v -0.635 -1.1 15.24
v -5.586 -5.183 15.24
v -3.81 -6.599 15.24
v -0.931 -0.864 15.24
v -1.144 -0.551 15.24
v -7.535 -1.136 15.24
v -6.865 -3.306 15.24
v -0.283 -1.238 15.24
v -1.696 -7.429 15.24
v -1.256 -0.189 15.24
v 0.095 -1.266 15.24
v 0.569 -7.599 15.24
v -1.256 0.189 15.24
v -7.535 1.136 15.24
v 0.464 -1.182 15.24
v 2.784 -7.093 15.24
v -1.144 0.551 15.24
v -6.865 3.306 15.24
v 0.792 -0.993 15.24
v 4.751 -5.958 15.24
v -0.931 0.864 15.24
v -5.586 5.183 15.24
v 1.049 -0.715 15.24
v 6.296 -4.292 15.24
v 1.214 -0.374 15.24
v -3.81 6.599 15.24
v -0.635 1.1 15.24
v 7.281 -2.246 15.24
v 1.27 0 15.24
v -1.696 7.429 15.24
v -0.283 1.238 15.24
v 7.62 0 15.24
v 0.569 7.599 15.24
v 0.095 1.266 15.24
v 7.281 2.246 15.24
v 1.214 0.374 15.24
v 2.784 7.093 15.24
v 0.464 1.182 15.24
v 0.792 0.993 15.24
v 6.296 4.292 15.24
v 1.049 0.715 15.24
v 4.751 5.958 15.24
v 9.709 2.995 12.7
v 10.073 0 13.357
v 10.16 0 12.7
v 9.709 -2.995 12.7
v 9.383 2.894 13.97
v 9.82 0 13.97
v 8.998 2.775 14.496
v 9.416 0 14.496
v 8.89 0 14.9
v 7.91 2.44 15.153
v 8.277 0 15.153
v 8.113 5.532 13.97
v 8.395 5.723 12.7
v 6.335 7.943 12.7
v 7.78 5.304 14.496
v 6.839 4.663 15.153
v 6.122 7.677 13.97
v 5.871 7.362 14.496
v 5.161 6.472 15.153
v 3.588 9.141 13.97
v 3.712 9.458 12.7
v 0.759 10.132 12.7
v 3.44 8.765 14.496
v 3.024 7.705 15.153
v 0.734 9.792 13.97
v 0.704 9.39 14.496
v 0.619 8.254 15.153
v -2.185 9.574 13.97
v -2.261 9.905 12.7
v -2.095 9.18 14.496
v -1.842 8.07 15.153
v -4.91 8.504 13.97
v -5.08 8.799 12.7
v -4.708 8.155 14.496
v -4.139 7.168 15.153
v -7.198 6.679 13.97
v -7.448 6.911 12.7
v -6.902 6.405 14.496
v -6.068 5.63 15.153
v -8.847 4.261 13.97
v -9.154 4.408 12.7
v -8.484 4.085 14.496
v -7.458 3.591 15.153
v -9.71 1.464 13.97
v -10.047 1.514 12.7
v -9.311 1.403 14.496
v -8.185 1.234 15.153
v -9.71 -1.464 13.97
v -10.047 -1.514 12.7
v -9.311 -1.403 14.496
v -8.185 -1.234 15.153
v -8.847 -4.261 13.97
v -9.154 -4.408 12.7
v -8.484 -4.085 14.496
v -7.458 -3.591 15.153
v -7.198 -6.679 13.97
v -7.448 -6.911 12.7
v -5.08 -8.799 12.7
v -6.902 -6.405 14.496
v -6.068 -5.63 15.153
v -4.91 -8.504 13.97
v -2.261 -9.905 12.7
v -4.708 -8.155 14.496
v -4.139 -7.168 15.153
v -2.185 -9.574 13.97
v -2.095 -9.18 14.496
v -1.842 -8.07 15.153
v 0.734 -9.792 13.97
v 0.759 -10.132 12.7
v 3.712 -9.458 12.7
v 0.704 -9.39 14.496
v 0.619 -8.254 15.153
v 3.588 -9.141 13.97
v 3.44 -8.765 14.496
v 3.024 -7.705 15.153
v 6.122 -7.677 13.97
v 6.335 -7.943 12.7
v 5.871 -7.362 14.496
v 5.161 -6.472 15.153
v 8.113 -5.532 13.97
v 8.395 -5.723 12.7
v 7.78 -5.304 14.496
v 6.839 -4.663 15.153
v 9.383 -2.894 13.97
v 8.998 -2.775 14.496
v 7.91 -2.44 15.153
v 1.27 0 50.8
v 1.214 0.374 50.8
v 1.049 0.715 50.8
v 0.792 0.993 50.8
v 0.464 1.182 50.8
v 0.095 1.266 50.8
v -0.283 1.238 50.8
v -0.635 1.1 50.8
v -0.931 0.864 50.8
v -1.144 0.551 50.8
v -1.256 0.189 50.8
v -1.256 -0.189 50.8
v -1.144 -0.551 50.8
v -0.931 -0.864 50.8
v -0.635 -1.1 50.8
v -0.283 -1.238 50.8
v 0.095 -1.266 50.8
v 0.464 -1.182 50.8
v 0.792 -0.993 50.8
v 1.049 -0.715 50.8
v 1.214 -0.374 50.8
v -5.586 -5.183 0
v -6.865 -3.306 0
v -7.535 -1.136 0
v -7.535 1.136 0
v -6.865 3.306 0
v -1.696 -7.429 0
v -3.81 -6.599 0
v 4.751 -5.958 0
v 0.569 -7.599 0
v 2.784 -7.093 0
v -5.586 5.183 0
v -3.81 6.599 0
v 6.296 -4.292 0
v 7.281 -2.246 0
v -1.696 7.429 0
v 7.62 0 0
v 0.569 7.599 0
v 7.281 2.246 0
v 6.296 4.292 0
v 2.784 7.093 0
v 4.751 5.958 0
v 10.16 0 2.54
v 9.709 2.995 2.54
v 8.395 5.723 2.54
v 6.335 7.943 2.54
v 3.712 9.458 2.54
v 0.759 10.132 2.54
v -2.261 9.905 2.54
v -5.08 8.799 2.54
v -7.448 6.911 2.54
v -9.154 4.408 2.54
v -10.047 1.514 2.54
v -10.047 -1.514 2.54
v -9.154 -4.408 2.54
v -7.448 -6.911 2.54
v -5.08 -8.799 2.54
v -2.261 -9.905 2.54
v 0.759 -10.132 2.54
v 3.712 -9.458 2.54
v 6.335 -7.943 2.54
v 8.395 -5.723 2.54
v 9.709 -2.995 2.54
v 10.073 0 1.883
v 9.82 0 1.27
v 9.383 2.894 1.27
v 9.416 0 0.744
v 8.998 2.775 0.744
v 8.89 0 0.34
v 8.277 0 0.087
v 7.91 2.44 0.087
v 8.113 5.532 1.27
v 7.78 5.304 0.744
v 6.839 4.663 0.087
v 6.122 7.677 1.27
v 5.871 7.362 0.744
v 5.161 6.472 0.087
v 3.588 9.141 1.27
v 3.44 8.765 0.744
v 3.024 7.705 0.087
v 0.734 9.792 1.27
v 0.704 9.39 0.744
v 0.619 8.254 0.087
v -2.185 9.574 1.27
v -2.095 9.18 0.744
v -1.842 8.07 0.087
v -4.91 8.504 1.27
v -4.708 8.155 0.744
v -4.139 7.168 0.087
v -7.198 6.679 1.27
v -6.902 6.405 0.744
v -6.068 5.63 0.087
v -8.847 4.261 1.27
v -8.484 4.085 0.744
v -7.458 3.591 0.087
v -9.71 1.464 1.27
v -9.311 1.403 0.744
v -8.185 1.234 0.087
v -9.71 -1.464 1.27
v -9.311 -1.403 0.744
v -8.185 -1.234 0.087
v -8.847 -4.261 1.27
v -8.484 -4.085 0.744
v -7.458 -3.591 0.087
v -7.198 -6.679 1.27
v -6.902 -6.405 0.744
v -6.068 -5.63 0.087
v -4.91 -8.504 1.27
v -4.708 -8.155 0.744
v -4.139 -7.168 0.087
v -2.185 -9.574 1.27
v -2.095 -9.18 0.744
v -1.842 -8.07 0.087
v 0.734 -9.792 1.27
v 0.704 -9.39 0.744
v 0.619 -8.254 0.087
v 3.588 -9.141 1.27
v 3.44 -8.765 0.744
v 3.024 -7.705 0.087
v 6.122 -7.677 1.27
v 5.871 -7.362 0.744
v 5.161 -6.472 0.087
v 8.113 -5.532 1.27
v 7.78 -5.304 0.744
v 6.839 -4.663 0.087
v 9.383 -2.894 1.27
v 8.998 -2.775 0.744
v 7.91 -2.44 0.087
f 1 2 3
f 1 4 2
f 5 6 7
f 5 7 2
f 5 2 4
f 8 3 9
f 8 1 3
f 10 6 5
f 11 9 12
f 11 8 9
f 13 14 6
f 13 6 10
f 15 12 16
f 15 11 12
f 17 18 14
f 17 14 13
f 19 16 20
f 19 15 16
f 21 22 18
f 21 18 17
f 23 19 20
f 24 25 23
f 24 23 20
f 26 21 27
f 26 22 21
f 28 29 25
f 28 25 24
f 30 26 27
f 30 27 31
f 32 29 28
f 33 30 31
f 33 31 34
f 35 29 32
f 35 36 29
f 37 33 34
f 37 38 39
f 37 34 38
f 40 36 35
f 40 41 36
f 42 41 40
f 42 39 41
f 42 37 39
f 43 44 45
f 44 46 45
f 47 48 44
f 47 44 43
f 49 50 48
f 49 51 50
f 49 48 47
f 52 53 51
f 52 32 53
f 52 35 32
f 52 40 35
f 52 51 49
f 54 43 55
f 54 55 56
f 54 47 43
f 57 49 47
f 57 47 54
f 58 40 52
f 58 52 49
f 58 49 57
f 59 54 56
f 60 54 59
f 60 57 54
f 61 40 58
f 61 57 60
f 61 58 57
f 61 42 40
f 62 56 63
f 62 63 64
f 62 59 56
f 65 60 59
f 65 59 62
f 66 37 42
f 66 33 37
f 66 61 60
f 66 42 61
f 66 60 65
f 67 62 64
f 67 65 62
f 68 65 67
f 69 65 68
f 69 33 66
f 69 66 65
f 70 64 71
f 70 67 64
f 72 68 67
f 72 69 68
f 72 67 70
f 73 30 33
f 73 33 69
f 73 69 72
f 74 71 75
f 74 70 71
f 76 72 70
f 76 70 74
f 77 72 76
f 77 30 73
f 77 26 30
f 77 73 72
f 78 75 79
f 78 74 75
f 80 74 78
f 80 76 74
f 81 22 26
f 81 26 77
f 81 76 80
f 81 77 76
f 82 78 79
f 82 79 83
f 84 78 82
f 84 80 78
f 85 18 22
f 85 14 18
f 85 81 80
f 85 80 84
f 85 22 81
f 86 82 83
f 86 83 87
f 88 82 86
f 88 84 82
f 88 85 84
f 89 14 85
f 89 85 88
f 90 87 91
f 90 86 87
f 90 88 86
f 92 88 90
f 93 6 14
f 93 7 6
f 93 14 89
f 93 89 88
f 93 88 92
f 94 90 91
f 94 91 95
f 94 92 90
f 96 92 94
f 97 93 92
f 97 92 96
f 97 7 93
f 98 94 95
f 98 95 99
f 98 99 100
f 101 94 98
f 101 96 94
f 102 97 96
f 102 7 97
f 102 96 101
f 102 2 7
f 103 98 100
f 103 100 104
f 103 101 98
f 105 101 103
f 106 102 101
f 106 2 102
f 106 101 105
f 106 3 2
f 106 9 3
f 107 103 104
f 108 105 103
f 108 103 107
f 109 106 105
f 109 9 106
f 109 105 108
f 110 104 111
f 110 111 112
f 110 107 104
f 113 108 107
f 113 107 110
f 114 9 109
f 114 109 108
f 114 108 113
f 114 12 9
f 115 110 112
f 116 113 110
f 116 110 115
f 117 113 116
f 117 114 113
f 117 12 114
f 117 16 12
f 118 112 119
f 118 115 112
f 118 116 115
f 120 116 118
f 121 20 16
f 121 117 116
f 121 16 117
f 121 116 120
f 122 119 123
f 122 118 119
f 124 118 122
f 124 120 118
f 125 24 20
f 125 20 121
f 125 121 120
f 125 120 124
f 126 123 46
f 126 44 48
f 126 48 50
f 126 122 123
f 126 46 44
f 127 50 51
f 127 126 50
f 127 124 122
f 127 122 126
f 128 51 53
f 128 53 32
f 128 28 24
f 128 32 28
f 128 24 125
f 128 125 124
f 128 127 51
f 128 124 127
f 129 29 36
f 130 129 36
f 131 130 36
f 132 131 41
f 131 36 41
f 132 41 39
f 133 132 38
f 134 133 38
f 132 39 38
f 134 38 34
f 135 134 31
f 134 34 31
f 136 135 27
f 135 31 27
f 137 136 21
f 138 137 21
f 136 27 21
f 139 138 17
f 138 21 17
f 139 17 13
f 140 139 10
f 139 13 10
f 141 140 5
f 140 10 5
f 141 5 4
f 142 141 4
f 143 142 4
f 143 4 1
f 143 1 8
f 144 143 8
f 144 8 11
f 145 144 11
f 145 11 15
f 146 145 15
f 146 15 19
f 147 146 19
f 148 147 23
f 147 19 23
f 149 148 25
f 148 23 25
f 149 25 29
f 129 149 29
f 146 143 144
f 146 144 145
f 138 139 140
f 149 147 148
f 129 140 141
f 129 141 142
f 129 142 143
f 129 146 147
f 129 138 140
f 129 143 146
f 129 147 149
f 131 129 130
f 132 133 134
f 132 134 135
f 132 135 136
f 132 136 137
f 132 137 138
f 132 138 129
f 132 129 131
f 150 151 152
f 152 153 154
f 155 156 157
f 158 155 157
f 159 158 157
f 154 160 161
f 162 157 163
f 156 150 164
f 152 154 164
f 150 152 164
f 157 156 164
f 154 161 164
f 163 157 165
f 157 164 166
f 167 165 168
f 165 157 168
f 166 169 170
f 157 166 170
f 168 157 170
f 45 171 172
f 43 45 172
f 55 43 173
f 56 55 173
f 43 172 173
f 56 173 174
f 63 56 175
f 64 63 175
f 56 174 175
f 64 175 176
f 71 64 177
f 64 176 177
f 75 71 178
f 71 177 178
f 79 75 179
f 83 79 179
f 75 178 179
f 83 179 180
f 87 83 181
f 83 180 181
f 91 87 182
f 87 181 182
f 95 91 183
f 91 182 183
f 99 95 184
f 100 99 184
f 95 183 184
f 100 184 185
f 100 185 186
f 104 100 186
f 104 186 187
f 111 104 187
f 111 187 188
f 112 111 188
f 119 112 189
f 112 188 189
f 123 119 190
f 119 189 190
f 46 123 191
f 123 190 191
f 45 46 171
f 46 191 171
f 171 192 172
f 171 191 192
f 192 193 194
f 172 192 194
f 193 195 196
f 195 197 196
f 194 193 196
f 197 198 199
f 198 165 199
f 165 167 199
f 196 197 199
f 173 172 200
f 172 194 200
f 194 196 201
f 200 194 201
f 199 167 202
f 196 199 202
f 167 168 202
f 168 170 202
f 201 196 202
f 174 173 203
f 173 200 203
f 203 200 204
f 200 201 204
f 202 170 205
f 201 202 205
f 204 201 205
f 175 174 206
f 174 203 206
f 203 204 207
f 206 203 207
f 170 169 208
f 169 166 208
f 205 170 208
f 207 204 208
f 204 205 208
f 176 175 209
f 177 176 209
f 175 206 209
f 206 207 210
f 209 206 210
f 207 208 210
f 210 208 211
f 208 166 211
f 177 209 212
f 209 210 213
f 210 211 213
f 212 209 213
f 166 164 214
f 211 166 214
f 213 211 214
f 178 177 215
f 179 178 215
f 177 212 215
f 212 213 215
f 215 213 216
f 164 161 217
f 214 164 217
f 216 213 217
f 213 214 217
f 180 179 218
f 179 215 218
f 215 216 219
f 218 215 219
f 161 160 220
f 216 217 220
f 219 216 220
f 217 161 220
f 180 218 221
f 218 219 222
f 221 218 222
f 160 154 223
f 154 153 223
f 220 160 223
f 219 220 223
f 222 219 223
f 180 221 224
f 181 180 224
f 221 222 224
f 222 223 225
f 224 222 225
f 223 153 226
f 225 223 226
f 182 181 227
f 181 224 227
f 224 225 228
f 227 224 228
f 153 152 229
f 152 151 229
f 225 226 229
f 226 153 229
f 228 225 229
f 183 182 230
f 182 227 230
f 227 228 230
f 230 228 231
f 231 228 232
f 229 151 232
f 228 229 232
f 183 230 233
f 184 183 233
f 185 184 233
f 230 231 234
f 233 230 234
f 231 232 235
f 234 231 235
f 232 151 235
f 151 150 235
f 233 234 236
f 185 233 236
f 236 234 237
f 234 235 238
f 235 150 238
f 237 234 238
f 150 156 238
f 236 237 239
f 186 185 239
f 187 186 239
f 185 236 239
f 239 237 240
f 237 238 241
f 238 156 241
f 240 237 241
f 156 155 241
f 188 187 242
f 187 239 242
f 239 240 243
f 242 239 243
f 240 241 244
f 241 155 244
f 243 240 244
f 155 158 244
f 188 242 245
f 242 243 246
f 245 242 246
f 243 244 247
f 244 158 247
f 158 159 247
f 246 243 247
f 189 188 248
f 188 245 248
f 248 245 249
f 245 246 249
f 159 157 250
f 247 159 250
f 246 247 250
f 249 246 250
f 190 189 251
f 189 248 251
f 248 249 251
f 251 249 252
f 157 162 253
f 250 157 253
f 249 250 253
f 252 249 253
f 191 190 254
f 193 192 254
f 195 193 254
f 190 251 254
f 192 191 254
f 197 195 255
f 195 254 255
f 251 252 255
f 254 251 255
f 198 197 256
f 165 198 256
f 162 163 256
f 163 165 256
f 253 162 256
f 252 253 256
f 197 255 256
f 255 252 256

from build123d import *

# Parameters (mm, degrees)
F0_R     = 10.16
F1_DEPTH = 15.24
F2_R     = 2.54
F3_R     = 1.27
F4_DEPTH = 35.56


with BuildPart() as f1:
    # F0 (on Top) → F1 (new body)
    with BuildSketch(Plane.XY):
        Circle(F0_R)
    extrude(amount=F1_DEPTH)

    # F2
    f2_edges = [f1.edges().sort_by_distance(p)[0] for p in [
        (-10.16, 0, 15.24),
        (-10.16, 0, 0),
    ]]
    fillet(f2_edges, radius=F2_R)

    # F3 (on face) → F4 (join)
    with BuildSketch(Plane.XY.offset(15.24)):
        Circle(F3_R)
    extrude(amount=F4_DEPTH)


solid = f1.part
